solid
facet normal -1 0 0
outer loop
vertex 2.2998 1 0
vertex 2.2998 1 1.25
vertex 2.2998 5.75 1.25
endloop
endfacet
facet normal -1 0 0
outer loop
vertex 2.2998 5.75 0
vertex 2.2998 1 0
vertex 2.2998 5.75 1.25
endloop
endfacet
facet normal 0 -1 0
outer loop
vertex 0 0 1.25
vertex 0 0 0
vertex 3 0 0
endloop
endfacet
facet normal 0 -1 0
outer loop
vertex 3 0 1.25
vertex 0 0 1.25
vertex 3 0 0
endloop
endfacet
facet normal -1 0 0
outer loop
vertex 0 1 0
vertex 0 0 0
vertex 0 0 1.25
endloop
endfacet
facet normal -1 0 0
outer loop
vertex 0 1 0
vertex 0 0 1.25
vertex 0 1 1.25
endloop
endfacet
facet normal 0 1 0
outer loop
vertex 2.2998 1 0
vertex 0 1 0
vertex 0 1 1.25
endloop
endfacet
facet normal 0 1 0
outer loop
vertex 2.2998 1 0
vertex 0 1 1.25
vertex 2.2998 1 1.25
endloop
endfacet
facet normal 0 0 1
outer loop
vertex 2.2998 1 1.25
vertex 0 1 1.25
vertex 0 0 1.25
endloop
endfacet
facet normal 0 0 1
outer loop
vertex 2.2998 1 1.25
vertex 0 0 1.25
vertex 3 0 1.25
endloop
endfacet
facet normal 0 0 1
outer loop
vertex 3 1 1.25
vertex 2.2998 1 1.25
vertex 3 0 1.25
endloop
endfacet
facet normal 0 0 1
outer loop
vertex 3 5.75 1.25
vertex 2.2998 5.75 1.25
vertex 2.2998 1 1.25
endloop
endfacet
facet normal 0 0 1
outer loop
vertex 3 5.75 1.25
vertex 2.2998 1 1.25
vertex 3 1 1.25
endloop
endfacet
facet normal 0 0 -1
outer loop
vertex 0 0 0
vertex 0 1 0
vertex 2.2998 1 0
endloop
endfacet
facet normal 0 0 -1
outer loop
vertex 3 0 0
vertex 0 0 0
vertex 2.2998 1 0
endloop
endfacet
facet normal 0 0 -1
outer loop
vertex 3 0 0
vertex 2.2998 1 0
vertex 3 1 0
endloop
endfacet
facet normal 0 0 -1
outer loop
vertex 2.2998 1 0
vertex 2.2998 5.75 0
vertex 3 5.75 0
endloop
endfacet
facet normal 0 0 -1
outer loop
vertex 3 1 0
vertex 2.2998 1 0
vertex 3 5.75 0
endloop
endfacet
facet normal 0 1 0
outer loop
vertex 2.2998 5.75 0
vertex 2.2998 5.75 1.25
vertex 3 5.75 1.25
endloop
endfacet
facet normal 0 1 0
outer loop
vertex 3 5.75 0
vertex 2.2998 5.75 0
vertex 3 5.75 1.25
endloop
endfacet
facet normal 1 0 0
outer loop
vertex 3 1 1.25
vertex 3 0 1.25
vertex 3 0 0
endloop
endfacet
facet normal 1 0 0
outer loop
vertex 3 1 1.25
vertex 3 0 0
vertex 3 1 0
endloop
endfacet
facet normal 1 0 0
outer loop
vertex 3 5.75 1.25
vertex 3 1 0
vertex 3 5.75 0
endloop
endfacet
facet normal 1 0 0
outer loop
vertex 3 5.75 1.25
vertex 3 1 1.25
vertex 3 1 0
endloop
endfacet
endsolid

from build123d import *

# Parameters (mm, degrees)
SKETCH1_W           = 3
SKETCH1_H           = 1
BOSS_EXTRUDE1_DEPTH = 1.25
SKETCH3_W           = 0.700162323
SKETCH3_H           = 4.75
BOSS_EXTRUDE2_DEPTH = 1.25


with BuildPart() as part:
    # Sketch1 → Boss-Extrude1 (new body)
    with BuildSketch(Plane.XY):
        with Locations((1.5, 0.5)):
            Rectangle(SKETCH1_W, SKETCH1_H)
    extrude(amount=BOSS_EXTRUDE1_DEPTH)

    # Sketch3 → Boss-Extrude2 (add)
    with BuildSketch(Plane.XY.offset(1.25)):
        with Locations((2.649918839, 3.375)):
            Rectangle(SKETCH3_W, SKETCH3_H)
    extrude(amount=-BOSS_EXTRUDE2_DEPTH)


solid = part.part
